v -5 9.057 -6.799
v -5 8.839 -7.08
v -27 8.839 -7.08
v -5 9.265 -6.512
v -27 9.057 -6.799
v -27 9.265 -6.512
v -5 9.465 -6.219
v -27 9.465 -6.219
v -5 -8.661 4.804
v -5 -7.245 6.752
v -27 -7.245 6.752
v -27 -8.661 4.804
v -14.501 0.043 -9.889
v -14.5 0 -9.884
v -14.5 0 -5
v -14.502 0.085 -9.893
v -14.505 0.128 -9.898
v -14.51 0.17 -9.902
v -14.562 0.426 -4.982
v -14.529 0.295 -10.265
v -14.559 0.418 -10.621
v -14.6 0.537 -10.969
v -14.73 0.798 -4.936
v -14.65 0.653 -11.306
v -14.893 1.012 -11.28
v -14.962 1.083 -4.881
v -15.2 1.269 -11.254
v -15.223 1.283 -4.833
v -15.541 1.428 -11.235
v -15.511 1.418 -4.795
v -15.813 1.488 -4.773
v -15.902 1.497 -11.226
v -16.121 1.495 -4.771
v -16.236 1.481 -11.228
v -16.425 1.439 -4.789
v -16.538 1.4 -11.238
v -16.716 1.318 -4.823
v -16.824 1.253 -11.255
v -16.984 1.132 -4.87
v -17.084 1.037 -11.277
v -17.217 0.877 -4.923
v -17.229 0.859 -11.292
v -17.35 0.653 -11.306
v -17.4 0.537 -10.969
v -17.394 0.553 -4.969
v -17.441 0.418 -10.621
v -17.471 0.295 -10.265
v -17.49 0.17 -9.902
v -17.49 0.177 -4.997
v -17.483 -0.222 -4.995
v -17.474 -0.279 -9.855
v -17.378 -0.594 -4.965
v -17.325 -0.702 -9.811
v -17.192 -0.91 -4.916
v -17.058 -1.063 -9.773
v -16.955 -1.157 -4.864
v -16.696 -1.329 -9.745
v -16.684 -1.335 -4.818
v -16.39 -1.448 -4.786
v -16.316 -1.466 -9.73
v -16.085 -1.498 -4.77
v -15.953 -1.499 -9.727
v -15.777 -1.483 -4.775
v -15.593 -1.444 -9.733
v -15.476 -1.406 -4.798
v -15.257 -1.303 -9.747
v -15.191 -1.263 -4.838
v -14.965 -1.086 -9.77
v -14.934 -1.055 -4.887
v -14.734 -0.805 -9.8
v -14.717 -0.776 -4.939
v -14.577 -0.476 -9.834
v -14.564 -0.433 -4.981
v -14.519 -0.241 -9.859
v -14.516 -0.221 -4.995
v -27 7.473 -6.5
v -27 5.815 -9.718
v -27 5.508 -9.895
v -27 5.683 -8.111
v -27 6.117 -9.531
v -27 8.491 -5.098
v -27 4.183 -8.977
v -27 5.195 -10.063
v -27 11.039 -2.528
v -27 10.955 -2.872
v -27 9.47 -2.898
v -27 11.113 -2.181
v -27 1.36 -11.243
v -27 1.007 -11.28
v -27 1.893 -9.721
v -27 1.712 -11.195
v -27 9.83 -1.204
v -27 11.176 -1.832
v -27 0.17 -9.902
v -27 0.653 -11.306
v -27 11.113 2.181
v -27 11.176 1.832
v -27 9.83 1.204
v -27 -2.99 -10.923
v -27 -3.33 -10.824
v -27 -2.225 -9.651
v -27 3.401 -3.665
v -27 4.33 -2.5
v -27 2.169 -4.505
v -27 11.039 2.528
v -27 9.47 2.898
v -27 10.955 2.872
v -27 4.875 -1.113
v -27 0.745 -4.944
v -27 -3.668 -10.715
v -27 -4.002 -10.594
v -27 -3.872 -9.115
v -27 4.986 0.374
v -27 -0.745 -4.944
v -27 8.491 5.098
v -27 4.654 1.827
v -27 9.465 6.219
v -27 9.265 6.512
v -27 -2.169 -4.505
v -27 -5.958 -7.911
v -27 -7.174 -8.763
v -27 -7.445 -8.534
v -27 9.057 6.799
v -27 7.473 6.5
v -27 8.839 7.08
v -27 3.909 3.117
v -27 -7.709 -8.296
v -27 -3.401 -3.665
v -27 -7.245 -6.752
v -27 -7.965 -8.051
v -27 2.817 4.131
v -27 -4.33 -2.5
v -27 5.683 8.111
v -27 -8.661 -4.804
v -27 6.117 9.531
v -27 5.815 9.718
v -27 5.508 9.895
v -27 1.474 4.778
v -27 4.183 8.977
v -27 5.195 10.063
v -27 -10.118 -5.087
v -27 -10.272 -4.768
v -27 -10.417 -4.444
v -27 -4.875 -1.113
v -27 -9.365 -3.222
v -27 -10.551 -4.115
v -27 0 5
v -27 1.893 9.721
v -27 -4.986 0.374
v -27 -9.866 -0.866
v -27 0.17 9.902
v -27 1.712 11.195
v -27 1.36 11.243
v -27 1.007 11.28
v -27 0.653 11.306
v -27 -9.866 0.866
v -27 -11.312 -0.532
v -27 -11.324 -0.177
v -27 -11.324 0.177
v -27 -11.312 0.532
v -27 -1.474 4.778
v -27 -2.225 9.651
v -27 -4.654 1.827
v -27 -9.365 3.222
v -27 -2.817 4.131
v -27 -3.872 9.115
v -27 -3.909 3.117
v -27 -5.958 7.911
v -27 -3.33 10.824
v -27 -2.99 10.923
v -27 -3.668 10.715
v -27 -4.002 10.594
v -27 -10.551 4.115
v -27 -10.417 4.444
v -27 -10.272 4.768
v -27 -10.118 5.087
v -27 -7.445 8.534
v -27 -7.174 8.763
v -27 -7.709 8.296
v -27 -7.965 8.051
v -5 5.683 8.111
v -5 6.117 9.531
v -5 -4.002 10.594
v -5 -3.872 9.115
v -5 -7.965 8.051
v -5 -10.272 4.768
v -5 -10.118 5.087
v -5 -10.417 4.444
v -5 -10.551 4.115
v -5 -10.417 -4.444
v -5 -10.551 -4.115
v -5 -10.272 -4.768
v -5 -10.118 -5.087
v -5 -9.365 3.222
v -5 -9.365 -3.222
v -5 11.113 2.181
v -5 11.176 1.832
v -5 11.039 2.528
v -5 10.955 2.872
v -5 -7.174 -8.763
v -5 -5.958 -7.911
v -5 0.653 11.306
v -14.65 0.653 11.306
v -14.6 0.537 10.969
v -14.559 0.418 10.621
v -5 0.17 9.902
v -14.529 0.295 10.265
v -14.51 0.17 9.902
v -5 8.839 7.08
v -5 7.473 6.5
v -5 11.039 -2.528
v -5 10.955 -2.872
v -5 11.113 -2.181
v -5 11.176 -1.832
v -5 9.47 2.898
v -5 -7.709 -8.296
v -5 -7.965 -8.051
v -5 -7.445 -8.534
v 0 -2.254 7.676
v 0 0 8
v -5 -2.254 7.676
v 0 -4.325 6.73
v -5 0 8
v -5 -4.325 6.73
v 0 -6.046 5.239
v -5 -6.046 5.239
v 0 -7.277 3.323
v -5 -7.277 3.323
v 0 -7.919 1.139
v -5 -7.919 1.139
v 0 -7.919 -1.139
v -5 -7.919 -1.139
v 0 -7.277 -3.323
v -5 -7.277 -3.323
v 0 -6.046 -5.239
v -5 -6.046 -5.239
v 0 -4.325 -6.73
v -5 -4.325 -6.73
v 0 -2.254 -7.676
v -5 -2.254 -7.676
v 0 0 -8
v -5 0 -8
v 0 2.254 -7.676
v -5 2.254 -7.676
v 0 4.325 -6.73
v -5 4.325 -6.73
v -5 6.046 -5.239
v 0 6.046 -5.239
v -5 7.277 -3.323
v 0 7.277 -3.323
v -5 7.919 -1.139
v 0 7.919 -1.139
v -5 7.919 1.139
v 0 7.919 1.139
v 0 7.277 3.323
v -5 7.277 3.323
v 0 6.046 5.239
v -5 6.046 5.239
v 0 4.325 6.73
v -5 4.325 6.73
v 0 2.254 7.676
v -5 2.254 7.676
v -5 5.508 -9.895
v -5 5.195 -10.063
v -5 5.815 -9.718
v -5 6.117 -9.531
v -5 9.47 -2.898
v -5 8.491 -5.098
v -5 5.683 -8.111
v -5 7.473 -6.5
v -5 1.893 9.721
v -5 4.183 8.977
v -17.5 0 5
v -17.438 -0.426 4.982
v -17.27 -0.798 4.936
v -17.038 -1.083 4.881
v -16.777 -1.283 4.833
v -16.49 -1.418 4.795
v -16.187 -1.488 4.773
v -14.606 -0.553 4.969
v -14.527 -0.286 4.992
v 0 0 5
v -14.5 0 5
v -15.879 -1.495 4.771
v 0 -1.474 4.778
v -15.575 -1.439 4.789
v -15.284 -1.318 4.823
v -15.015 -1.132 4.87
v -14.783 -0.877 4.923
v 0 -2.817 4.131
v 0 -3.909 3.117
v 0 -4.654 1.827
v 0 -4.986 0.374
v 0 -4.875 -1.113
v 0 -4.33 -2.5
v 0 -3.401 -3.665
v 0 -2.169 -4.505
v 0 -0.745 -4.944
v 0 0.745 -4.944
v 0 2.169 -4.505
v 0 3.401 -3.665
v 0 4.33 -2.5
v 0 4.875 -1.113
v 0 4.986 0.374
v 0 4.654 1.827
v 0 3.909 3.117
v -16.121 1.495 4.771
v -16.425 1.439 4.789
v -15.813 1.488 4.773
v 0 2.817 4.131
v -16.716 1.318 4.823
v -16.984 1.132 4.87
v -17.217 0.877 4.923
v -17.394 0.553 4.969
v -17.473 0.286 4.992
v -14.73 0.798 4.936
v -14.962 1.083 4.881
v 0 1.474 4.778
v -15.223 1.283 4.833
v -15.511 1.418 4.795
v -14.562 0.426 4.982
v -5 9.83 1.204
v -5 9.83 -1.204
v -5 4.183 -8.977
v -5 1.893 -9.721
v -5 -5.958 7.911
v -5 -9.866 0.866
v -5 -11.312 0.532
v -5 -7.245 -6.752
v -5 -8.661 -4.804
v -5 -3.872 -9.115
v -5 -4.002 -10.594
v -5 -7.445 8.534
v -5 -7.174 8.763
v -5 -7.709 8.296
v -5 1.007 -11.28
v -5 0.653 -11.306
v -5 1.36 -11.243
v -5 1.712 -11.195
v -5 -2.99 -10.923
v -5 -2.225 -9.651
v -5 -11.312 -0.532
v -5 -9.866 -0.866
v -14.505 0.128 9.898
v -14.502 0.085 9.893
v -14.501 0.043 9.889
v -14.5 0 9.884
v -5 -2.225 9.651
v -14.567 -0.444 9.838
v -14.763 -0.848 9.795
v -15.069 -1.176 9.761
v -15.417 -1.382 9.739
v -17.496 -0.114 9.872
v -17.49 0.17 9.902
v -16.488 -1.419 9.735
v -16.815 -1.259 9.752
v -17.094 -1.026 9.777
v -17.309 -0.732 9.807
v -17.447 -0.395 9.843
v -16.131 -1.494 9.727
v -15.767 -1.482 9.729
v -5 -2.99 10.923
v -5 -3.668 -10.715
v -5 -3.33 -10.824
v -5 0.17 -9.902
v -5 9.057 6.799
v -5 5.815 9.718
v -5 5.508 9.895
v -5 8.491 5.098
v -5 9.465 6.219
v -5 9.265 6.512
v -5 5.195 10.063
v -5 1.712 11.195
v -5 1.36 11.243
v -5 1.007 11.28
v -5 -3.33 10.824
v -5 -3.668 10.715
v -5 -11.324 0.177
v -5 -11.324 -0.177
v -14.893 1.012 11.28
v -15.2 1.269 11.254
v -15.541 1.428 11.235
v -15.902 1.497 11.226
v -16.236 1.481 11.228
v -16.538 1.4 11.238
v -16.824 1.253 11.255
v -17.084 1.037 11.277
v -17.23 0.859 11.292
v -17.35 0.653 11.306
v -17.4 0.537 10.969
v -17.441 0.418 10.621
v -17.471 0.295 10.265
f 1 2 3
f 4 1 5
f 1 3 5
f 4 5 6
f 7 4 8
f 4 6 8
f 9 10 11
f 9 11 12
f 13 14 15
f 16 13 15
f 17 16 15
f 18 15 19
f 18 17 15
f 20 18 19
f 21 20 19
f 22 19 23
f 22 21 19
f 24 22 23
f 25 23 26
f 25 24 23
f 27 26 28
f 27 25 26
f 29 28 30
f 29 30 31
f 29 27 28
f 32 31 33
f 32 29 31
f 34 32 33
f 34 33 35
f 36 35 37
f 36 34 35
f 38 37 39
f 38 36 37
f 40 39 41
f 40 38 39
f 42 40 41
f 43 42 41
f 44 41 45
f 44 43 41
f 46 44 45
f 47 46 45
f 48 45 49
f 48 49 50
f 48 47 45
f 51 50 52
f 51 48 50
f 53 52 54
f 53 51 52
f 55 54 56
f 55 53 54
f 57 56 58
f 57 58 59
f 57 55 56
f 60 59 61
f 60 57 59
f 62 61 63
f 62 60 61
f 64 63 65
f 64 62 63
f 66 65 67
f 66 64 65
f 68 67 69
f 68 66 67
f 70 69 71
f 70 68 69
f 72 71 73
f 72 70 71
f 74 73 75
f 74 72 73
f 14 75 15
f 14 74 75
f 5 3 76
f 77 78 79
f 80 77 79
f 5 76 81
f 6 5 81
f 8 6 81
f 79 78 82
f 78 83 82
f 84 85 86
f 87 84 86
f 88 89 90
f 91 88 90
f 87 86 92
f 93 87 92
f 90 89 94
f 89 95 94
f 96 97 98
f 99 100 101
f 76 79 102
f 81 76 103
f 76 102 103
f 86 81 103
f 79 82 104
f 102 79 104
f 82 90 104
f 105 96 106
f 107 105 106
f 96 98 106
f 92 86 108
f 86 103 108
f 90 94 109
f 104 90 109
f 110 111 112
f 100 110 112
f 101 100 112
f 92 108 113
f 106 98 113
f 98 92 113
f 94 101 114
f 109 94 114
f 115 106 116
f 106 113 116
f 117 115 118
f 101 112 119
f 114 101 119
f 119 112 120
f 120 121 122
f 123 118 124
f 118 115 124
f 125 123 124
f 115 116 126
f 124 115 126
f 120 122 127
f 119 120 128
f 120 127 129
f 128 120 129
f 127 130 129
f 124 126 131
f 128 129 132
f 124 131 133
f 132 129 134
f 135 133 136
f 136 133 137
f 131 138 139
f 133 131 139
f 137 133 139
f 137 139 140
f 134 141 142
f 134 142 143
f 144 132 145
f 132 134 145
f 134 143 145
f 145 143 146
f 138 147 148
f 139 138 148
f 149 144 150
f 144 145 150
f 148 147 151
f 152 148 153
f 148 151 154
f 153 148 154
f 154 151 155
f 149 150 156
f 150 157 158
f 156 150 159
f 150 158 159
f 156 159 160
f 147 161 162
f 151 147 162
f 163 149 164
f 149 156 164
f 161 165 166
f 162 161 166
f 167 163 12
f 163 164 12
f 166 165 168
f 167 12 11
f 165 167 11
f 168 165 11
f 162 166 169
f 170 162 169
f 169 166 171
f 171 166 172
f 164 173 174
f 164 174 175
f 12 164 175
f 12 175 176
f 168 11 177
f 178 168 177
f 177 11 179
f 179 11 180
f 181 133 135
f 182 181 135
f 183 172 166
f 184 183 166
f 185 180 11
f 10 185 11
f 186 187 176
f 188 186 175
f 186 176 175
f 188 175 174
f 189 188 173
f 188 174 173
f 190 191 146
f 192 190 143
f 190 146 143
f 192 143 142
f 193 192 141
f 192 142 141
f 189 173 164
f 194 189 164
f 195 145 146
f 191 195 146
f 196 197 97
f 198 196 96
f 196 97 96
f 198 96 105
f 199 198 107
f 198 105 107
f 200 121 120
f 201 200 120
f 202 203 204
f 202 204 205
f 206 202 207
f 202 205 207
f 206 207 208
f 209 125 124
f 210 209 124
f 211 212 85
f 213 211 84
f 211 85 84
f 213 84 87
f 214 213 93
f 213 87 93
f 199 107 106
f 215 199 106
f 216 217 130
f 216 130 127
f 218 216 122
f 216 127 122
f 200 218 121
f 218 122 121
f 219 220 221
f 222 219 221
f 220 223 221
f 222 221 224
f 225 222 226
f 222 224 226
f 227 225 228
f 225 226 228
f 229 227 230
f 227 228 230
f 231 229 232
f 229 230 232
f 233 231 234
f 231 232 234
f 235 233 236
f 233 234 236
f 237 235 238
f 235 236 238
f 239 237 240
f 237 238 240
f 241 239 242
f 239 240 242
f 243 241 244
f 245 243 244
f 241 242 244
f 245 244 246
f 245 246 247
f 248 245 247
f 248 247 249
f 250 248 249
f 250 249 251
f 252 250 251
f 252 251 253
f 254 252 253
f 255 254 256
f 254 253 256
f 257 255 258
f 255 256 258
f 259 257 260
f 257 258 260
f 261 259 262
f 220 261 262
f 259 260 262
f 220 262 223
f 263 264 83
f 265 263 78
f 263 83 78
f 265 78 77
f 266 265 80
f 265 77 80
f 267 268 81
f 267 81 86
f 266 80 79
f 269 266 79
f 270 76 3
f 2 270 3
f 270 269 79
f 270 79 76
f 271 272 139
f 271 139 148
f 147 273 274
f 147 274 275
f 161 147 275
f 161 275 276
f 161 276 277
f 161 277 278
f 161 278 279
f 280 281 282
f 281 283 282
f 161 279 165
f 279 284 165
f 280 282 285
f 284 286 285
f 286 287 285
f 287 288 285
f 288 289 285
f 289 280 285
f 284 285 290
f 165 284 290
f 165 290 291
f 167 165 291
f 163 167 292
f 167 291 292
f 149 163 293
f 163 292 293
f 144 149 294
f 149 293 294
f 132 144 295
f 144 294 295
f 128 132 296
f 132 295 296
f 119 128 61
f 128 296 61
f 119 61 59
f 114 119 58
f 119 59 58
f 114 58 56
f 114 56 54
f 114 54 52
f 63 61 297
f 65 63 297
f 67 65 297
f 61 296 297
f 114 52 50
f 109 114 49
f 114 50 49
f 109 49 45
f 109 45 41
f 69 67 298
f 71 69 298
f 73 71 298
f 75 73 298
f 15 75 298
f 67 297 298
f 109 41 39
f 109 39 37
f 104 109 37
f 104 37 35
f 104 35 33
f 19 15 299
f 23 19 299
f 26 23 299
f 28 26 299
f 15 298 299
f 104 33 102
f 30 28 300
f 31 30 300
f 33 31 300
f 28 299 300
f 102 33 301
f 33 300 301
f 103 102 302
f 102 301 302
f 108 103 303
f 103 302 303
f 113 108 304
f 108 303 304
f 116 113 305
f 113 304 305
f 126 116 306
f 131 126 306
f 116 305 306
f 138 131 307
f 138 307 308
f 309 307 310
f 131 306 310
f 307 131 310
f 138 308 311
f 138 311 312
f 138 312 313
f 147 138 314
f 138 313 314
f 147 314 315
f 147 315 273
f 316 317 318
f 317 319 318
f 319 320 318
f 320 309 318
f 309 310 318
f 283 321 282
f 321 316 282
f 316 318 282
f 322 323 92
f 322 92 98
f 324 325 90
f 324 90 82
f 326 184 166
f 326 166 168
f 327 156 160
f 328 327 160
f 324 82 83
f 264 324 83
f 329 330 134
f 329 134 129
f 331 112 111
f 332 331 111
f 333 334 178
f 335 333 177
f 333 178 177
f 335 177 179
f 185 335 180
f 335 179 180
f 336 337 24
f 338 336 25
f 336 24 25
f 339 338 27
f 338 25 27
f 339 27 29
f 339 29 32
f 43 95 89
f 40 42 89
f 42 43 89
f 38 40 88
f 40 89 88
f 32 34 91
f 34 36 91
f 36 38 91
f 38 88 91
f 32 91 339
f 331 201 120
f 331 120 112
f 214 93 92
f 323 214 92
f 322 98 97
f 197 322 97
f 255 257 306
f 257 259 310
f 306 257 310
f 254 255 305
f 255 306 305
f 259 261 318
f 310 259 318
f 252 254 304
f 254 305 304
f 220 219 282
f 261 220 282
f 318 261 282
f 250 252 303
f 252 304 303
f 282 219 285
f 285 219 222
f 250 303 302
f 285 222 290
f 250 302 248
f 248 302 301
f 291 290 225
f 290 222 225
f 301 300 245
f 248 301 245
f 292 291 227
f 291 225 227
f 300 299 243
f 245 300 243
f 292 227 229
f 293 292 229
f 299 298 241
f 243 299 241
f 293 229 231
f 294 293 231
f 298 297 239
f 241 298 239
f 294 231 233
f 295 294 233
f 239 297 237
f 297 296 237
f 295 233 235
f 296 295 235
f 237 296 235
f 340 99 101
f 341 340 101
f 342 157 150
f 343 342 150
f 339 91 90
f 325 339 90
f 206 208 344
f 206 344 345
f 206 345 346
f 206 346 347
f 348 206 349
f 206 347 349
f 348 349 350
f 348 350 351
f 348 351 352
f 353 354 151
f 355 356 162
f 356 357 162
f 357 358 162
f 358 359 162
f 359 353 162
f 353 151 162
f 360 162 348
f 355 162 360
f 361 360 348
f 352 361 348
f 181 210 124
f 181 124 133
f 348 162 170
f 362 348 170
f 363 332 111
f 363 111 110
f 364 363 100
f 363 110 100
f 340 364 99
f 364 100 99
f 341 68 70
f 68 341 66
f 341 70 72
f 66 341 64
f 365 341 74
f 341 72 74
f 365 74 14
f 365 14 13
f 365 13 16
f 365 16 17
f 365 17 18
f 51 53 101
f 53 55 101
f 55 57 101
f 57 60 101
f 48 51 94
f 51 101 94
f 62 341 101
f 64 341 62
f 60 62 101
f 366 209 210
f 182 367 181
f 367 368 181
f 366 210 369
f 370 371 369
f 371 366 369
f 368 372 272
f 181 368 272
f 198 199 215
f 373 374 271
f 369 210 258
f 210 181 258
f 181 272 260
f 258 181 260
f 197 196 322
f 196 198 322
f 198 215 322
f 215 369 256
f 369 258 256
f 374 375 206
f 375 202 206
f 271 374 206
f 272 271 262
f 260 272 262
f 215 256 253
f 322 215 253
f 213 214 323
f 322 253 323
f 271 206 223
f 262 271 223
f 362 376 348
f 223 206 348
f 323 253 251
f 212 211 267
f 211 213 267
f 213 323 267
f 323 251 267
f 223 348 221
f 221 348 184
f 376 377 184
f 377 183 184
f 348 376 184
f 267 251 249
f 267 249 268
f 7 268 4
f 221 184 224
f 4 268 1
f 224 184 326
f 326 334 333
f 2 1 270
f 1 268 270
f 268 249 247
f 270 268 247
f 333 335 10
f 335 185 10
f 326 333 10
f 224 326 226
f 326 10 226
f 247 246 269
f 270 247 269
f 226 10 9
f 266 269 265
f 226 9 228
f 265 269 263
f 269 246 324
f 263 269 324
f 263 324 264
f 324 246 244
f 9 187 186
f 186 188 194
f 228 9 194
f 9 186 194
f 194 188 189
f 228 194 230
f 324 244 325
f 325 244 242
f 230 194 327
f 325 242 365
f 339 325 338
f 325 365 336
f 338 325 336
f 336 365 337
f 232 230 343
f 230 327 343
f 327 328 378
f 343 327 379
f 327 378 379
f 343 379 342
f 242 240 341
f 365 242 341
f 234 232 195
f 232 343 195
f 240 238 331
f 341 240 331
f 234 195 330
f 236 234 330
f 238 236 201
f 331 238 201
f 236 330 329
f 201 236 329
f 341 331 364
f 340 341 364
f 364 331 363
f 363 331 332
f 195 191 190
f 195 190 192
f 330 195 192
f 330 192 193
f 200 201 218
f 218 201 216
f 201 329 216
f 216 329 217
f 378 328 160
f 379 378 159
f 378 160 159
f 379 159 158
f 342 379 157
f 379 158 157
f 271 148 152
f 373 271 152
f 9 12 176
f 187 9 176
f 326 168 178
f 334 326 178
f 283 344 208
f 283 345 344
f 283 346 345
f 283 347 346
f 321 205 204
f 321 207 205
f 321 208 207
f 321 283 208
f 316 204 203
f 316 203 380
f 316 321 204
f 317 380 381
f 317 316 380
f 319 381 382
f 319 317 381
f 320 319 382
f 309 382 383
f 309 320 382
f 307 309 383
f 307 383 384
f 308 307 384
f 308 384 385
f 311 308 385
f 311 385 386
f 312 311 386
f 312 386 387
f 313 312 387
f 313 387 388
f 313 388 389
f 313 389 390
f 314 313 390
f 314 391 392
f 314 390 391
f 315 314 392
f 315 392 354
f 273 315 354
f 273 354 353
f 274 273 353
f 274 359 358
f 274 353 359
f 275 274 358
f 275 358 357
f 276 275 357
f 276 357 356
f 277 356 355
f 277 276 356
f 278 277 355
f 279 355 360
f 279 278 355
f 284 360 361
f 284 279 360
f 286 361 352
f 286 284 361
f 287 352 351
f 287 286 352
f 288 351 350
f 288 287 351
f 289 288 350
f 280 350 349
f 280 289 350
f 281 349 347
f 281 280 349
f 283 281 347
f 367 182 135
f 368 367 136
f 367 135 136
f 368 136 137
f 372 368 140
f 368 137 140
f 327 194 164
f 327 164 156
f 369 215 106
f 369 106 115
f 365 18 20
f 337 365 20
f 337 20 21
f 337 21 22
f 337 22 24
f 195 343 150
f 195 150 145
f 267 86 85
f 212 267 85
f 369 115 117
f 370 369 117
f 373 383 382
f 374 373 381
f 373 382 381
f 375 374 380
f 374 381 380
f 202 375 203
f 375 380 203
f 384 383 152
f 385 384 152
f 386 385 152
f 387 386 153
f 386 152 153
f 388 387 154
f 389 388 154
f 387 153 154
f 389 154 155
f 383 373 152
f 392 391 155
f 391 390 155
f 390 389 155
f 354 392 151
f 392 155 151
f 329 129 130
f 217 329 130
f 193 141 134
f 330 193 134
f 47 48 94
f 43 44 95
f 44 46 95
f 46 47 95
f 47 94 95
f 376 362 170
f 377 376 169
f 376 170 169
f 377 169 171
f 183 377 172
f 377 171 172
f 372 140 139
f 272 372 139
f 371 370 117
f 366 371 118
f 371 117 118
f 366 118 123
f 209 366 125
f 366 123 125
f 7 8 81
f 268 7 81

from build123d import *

# Parameters (mm, degrees)
ENL_V_MAT_EXTRU_1_DEPTH      = 32.392853486
ENL_V_MAT_EXTRU_1_DEPTH_BACK = 32.392853486
ESQUISSE2_R                  = 1.5
ENL_V_MAT_EXTRU_2_REACH      = 33.393
R_P_TITION_CIRCULAIRE1_COUNT = 15


with BuildPart() as part:
    # Esquisse1 → Révolution1 (revolve)
    with BuildSketch(Plane.XY, mode=Mode.PRIVATE) as r_volution1_sk:
        Polygon((0, 5), (0, 8), (-5, 8), (-5, 11.325), (-27, 11.325), (-27, 5), align=None)
    revolve(r_volution1_sk.sketch.rotate(Axis((-12.25475793, 0, 0), (1, 0, 0)), 90), axis=Axis((-12.25475793, 0, 0), (1, 0, 0)))

    # Esquisse2 → Enlèv. mat.-Extru.1 (cut, two sides: drawn at the far end of the back side and taken through both)
    with BuildSketch(Plane.XY.offset(-ENL_V_MAT_EXTRU_1_DEPTH_BACK)):
        with Locations((-16, 0)):
            Circle(ESQUISSE2_R)
    extrude(amount=ENL_V_MAT_EXTRU_1_DEPTH + ENL_V_MAT_EXTRU_1_DEPTH_BACK, mode=Mode.SUBTRACT)

    # Esquisse3 → Enlèv. mat.-Extru.2 (cut, up to next)
    with BuildSketch(Plane.ZY.offset(27), mode=Mode.PRIVATE) as enl_v_mat_extru_2_sk1:
        with BuildLine():
            Line((-2.16, 11.88023674), (-1.204069301, 9.83023674))
            Line((-1.204069301, 9.83023674), (1.204069301, 9.83023674))
            Line((1.204069301, 9.83023674), (2.16, 11.88023674))
            ThreePointArc((2.16, 11.88023674), (0, 12.075), (-2.16, 11.88023674))
        make_face()
    enl_v_mat_extru_2_tool1 = extrude(enl_v_mat_extru_2_sk1.sketch, amount=-ENL_V_MAT_EXTRU_2_REACH, mode=Mode.PRIVATE) & part.part
    enl_v_mat_extru_2 = enl_v_mat_extru_2_tool1.solids().sort_by_distance((-27, 11.028097, 0))[0]
    add(enl_v_mat_extru_2, mode=Mode.SUBTRACT)

    # Répétition circulaire1: Enlèv. mat.-Extru.2 ×15 about axis
    r_p_tition_circulaire1_axis = Axis((0, 0, 0), (1, 0, 0))
    for i in range(1, R_P_TITION_CIRCULAIRE1_COUNT):
        add(enl_v_mat_extru_2.rotate(r_p_tition_circulaire1_axis, i * 360 / R_P_TITION_CIRCULAIRE1_COUNT), mode=Mode.SUBTRACT)


solid = part.part
